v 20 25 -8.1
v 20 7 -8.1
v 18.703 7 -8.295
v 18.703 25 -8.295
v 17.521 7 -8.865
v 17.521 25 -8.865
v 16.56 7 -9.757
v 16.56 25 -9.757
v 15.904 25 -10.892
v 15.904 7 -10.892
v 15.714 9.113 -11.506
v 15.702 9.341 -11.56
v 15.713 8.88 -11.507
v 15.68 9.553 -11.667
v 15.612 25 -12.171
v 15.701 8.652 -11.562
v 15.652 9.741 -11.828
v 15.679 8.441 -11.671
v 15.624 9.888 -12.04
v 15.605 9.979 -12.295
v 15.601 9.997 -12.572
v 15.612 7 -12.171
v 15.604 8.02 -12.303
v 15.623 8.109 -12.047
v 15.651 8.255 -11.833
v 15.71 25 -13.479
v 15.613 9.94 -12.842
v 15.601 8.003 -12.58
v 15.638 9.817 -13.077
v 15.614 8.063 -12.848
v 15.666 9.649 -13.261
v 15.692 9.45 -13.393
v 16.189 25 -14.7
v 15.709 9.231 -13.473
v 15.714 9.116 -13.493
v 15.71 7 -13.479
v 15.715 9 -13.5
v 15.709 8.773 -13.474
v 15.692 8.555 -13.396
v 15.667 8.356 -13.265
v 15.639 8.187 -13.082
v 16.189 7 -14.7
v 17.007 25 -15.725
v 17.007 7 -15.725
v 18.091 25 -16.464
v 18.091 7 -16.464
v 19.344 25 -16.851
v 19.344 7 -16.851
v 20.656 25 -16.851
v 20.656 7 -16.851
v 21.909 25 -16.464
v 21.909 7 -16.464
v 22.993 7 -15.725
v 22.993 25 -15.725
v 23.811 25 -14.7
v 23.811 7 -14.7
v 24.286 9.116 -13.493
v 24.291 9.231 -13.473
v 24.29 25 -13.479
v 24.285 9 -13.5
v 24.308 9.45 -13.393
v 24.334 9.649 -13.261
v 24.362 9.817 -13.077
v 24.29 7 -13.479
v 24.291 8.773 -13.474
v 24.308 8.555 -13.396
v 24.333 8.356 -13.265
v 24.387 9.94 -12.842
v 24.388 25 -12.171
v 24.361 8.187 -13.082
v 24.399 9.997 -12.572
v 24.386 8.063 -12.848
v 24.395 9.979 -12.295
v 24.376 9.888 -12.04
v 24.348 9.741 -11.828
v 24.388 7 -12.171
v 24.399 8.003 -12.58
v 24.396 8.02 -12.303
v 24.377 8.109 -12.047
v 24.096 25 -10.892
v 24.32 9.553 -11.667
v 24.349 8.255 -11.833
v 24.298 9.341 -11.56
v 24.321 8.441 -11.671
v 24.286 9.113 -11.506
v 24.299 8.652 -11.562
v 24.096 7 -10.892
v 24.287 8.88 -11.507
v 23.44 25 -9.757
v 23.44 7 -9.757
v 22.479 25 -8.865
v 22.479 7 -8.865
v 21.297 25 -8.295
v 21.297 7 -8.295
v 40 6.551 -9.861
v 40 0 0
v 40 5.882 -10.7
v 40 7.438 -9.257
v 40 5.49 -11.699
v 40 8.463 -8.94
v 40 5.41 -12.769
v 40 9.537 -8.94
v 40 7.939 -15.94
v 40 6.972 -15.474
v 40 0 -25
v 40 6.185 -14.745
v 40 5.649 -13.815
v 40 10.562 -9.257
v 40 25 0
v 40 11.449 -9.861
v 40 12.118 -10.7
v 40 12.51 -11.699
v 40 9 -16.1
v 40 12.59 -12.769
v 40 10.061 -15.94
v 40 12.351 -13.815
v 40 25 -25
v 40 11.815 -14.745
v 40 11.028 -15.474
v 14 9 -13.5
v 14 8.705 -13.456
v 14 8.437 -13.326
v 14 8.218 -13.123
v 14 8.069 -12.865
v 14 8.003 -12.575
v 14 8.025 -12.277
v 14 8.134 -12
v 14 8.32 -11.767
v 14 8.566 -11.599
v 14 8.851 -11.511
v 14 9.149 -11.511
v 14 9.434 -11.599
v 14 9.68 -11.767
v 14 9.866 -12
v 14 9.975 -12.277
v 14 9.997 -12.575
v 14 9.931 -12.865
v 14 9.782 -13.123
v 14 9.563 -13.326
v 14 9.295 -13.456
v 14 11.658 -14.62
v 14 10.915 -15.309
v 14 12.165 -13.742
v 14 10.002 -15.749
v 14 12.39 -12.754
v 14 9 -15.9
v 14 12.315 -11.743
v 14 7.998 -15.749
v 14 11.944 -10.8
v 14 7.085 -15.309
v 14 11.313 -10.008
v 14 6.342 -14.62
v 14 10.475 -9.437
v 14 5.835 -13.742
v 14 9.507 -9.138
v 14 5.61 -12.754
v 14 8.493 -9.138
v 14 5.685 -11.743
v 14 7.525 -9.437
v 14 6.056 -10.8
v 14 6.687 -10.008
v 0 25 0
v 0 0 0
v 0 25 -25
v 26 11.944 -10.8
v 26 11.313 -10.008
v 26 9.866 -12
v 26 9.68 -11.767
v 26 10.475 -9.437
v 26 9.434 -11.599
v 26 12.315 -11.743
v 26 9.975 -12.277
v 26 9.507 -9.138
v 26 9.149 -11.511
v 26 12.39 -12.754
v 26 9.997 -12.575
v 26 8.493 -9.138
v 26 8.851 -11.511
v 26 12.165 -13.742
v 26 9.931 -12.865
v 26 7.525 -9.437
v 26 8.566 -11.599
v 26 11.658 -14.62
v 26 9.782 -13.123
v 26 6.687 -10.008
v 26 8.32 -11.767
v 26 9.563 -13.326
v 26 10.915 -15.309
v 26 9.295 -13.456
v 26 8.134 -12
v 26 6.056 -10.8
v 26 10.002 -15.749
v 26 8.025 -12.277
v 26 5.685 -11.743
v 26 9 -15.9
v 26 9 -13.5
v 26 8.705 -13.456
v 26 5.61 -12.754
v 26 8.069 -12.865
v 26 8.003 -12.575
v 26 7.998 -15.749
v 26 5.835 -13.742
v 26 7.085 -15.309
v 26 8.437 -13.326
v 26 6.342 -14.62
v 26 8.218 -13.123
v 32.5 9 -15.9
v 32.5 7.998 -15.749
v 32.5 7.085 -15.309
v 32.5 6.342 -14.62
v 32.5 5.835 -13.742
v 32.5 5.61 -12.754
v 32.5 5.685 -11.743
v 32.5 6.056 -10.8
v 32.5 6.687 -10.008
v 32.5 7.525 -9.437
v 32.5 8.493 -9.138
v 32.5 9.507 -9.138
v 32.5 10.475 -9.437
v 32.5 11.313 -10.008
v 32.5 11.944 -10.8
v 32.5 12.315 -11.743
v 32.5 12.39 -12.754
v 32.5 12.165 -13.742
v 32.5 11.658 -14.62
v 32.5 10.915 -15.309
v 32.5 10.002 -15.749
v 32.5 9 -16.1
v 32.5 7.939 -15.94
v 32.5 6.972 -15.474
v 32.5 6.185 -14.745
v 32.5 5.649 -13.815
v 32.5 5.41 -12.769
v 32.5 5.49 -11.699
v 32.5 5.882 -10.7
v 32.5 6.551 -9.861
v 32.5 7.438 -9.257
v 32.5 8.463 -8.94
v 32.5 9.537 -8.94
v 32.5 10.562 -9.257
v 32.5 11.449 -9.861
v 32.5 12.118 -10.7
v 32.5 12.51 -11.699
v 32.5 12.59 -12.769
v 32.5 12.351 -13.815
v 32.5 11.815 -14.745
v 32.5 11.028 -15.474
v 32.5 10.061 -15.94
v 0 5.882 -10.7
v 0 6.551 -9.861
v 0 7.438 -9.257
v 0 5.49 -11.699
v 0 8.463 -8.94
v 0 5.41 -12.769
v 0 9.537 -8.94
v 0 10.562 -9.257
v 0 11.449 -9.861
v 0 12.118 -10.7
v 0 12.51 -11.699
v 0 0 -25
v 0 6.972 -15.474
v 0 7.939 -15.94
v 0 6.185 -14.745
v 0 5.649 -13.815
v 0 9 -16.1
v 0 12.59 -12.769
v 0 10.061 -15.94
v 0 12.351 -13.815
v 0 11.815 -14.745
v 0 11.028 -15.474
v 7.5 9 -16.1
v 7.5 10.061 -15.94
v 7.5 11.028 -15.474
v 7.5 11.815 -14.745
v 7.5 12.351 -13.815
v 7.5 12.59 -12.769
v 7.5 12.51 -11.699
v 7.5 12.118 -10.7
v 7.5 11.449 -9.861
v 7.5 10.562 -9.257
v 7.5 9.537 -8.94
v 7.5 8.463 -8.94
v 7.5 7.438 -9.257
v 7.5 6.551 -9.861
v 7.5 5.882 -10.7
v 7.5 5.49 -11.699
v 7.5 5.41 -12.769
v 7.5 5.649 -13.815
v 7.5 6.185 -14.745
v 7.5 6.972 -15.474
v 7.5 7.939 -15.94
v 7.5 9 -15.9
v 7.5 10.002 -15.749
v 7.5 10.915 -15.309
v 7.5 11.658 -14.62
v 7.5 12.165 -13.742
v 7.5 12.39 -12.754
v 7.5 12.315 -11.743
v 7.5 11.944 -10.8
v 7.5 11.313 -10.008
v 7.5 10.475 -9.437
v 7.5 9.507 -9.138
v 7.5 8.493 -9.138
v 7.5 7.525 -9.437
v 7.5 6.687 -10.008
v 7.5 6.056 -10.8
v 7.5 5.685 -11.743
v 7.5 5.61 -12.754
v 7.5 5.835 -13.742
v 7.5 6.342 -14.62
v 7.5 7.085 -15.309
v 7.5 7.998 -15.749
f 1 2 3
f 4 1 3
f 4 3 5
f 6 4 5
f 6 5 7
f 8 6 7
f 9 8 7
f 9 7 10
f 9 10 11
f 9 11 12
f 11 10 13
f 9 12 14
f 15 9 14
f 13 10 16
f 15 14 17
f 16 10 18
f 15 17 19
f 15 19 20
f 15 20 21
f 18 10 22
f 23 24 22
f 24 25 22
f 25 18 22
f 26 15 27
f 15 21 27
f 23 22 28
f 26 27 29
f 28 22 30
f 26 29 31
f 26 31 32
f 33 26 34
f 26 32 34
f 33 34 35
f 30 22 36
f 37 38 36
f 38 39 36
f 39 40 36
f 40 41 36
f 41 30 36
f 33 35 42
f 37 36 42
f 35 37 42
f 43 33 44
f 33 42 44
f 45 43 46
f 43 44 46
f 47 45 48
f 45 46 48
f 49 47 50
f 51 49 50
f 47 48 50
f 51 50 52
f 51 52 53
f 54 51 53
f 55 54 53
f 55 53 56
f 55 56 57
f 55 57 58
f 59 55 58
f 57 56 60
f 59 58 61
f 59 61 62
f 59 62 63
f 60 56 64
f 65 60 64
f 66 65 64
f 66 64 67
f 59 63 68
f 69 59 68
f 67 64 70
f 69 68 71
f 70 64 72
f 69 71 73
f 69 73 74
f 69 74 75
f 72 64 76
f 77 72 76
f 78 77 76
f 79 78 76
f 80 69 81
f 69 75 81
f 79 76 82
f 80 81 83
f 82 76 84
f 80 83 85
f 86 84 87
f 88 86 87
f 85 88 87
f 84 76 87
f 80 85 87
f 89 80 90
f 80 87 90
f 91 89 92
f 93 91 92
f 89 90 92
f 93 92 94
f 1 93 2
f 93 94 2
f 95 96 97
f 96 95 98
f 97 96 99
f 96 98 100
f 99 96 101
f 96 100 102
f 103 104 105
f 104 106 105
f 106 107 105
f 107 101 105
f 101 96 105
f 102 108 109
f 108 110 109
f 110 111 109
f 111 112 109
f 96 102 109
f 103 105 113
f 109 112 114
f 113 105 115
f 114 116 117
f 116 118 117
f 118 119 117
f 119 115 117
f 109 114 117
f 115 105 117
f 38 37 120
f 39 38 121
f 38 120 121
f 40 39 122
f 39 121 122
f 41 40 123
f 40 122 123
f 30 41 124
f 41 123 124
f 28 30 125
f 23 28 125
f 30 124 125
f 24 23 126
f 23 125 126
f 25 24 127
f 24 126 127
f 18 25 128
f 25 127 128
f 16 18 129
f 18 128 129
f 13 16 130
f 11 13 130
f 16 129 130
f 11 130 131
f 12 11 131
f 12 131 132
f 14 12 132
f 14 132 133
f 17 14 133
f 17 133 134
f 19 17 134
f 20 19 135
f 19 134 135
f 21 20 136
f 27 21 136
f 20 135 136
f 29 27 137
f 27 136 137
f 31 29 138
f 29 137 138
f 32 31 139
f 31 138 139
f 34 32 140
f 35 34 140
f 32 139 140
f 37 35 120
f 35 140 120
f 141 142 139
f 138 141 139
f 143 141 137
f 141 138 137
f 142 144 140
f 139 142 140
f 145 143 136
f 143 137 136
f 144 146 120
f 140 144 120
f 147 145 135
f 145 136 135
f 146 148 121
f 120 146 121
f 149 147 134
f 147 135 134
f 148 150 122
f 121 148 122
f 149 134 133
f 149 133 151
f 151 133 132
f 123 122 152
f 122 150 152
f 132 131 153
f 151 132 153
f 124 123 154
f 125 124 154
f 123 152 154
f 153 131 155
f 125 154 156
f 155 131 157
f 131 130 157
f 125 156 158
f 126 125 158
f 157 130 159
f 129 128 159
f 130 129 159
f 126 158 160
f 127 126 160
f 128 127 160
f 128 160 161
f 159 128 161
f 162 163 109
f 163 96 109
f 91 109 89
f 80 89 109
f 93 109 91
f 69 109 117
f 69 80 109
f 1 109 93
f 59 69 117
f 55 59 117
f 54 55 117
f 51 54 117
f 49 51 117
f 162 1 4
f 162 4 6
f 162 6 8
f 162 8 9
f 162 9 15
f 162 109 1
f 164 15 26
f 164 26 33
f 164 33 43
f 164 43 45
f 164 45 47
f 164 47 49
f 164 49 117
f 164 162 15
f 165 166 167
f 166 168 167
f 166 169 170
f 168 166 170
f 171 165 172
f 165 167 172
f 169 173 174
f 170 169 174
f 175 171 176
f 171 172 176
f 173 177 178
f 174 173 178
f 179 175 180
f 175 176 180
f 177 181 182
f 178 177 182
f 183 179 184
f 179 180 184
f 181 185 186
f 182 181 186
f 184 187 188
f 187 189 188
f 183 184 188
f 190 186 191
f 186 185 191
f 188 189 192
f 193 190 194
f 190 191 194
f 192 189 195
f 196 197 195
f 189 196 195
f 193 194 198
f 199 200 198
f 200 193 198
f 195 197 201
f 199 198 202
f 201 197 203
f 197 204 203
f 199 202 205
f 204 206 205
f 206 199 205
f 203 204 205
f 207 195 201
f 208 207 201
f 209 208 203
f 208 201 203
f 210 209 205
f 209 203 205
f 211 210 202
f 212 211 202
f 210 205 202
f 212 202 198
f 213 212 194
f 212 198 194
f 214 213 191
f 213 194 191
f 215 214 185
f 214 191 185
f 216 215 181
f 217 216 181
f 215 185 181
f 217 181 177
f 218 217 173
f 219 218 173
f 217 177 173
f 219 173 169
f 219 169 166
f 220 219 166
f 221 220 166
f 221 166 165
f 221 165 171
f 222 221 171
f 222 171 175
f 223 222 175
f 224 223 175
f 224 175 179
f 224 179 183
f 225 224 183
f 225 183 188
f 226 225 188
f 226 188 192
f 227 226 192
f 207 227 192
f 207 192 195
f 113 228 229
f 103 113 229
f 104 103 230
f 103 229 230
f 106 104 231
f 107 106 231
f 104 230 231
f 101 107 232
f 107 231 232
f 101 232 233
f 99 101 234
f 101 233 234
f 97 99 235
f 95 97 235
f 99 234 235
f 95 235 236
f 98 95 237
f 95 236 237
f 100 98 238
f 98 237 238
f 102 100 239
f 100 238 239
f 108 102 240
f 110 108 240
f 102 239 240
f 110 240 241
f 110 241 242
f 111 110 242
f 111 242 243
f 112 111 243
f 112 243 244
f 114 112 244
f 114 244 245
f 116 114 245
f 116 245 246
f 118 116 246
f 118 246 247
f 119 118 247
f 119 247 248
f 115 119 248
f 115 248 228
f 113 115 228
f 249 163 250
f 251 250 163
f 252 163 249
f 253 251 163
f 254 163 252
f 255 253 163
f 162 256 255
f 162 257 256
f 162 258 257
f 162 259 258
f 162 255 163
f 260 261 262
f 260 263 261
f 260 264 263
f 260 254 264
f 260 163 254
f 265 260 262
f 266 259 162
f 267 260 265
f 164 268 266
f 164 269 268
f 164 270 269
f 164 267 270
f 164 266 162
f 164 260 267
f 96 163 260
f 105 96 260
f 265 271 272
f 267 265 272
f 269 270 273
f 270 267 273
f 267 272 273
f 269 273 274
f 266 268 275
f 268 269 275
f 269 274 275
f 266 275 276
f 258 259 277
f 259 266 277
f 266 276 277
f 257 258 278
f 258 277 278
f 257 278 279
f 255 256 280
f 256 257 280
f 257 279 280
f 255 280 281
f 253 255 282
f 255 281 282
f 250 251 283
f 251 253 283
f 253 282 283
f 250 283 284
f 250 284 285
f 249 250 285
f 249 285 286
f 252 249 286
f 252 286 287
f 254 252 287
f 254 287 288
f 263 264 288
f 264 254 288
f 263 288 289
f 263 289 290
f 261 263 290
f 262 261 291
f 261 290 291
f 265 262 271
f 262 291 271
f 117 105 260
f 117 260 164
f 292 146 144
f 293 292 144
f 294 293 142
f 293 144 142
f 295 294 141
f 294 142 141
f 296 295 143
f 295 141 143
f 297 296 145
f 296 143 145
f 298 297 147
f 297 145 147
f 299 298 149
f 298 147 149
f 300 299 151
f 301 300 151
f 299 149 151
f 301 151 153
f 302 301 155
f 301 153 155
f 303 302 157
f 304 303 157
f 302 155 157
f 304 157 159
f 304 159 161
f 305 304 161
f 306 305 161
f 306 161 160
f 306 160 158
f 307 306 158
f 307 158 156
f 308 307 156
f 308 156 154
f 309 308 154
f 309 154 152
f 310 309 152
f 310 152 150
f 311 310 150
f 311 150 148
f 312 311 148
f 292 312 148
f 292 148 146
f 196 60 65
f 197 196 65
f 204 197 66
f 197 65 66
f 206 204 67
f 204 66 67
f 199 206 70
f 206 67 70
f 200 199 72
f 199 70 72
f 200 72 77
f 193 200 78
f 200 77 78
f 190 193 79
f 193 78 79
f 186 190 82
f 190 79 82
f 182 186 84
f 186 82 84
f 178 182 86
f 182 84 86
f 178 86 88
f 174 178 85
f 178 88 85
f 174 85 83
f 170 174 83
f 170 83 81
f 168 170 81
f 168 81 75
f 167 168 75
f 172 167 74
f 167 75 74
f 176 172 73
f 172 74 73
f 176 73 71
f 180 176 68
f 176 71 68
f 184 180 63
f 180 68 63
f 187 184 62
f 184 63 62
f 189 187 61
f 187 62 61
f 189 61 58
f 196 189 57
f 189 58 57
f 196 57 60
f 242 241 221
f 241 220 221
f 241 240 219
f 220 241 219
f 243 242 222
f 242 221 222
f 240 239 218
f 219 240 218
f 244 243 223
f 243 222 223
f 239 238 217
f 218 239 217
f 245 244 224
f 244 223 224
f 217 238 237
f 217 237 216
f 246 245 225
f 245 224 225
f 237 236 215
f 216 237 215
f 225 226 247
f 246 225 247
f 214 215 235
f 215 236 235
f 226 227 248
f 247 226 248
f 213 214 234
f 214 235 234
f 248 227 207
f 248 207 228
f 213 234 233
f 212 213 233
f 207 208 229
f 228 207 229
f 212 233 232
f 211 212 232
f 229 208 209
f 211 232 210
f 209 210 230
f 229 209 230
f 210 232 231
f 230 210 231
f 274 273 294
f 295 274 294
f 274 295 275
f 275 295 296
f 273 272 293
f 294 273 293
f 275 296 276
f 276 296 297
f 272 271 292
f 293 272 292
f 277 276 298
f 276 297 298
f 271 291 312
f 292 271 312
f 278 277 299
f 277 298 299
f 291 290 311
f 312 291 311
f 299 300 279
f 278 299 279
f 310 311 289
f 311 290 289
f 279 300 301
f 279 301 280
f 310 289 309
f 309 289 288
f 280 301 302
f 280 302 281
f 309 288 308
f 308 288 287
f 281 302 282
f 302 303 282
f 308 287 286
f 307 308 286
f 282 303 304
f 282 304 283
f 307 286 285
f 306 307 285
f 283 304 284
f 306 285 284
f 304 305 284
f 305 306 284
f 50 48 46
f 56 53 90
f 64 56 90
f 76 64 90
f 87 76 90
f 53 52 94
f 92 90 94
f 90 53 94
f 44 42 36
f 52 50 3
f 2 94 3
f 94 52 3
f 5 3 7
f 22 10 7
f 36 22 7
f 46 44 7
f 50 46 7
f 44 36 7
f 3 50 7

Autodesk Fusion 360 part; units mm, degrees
box "BoxPrimitive1" add length 25 width 40 height 25 placed x (0, 0, -1) y (-1, 0, 0) z (0, 1, 0) at (40, 0, 0)
hole "Hole1" at (20, 25, -12.5) direction (0, -1, 0) diameter 8.8 depth 18 tip angle 180
sketch "Sketch2" plane through (40, 0, 0) normal (1, 0, 0) x (0, 0, -1)
  line L0 (0, 25) -> (0, 0)
  line L1 (0, 0) -> (25, 0)
  line L2 (25, 0) -> (25, 25)
  line L3 (25, 25) -> (0, 25)
  line L4 (12.5, 25) -> (12.5, 7) construction
  point P0 (12.5, 9)
  dimension "d9" = 18
  dimension "d10" = 2
hole "Hole2" at (40, 9, -12.5) direction (-1, 0, 0) diameter 2 end through all
hole "Hole3" at (40, 9, -12.5) direction (-1, 0, 0) diameter 6.8 depth 14 tip angle 180
hole "Hole5" at (40, 9, -12.5) direction (-1, 0, 0) diameter 7.2 depth 7.5 tip angle 180
ref_plane "WorkPlane1" through (20, 12.5, -12.5) normal (-1, 0, 0) x (0, 1, 0)
mirror "Mirror1" about plane through (20, 12.5, -12.5) normal (-1, 0, 0) of "Hole3", "Hole5"
ref_plane "WorkPlane2" through (20, 12.5, -12.5) normal (0, 0, 1) x (0, 1, 0)
